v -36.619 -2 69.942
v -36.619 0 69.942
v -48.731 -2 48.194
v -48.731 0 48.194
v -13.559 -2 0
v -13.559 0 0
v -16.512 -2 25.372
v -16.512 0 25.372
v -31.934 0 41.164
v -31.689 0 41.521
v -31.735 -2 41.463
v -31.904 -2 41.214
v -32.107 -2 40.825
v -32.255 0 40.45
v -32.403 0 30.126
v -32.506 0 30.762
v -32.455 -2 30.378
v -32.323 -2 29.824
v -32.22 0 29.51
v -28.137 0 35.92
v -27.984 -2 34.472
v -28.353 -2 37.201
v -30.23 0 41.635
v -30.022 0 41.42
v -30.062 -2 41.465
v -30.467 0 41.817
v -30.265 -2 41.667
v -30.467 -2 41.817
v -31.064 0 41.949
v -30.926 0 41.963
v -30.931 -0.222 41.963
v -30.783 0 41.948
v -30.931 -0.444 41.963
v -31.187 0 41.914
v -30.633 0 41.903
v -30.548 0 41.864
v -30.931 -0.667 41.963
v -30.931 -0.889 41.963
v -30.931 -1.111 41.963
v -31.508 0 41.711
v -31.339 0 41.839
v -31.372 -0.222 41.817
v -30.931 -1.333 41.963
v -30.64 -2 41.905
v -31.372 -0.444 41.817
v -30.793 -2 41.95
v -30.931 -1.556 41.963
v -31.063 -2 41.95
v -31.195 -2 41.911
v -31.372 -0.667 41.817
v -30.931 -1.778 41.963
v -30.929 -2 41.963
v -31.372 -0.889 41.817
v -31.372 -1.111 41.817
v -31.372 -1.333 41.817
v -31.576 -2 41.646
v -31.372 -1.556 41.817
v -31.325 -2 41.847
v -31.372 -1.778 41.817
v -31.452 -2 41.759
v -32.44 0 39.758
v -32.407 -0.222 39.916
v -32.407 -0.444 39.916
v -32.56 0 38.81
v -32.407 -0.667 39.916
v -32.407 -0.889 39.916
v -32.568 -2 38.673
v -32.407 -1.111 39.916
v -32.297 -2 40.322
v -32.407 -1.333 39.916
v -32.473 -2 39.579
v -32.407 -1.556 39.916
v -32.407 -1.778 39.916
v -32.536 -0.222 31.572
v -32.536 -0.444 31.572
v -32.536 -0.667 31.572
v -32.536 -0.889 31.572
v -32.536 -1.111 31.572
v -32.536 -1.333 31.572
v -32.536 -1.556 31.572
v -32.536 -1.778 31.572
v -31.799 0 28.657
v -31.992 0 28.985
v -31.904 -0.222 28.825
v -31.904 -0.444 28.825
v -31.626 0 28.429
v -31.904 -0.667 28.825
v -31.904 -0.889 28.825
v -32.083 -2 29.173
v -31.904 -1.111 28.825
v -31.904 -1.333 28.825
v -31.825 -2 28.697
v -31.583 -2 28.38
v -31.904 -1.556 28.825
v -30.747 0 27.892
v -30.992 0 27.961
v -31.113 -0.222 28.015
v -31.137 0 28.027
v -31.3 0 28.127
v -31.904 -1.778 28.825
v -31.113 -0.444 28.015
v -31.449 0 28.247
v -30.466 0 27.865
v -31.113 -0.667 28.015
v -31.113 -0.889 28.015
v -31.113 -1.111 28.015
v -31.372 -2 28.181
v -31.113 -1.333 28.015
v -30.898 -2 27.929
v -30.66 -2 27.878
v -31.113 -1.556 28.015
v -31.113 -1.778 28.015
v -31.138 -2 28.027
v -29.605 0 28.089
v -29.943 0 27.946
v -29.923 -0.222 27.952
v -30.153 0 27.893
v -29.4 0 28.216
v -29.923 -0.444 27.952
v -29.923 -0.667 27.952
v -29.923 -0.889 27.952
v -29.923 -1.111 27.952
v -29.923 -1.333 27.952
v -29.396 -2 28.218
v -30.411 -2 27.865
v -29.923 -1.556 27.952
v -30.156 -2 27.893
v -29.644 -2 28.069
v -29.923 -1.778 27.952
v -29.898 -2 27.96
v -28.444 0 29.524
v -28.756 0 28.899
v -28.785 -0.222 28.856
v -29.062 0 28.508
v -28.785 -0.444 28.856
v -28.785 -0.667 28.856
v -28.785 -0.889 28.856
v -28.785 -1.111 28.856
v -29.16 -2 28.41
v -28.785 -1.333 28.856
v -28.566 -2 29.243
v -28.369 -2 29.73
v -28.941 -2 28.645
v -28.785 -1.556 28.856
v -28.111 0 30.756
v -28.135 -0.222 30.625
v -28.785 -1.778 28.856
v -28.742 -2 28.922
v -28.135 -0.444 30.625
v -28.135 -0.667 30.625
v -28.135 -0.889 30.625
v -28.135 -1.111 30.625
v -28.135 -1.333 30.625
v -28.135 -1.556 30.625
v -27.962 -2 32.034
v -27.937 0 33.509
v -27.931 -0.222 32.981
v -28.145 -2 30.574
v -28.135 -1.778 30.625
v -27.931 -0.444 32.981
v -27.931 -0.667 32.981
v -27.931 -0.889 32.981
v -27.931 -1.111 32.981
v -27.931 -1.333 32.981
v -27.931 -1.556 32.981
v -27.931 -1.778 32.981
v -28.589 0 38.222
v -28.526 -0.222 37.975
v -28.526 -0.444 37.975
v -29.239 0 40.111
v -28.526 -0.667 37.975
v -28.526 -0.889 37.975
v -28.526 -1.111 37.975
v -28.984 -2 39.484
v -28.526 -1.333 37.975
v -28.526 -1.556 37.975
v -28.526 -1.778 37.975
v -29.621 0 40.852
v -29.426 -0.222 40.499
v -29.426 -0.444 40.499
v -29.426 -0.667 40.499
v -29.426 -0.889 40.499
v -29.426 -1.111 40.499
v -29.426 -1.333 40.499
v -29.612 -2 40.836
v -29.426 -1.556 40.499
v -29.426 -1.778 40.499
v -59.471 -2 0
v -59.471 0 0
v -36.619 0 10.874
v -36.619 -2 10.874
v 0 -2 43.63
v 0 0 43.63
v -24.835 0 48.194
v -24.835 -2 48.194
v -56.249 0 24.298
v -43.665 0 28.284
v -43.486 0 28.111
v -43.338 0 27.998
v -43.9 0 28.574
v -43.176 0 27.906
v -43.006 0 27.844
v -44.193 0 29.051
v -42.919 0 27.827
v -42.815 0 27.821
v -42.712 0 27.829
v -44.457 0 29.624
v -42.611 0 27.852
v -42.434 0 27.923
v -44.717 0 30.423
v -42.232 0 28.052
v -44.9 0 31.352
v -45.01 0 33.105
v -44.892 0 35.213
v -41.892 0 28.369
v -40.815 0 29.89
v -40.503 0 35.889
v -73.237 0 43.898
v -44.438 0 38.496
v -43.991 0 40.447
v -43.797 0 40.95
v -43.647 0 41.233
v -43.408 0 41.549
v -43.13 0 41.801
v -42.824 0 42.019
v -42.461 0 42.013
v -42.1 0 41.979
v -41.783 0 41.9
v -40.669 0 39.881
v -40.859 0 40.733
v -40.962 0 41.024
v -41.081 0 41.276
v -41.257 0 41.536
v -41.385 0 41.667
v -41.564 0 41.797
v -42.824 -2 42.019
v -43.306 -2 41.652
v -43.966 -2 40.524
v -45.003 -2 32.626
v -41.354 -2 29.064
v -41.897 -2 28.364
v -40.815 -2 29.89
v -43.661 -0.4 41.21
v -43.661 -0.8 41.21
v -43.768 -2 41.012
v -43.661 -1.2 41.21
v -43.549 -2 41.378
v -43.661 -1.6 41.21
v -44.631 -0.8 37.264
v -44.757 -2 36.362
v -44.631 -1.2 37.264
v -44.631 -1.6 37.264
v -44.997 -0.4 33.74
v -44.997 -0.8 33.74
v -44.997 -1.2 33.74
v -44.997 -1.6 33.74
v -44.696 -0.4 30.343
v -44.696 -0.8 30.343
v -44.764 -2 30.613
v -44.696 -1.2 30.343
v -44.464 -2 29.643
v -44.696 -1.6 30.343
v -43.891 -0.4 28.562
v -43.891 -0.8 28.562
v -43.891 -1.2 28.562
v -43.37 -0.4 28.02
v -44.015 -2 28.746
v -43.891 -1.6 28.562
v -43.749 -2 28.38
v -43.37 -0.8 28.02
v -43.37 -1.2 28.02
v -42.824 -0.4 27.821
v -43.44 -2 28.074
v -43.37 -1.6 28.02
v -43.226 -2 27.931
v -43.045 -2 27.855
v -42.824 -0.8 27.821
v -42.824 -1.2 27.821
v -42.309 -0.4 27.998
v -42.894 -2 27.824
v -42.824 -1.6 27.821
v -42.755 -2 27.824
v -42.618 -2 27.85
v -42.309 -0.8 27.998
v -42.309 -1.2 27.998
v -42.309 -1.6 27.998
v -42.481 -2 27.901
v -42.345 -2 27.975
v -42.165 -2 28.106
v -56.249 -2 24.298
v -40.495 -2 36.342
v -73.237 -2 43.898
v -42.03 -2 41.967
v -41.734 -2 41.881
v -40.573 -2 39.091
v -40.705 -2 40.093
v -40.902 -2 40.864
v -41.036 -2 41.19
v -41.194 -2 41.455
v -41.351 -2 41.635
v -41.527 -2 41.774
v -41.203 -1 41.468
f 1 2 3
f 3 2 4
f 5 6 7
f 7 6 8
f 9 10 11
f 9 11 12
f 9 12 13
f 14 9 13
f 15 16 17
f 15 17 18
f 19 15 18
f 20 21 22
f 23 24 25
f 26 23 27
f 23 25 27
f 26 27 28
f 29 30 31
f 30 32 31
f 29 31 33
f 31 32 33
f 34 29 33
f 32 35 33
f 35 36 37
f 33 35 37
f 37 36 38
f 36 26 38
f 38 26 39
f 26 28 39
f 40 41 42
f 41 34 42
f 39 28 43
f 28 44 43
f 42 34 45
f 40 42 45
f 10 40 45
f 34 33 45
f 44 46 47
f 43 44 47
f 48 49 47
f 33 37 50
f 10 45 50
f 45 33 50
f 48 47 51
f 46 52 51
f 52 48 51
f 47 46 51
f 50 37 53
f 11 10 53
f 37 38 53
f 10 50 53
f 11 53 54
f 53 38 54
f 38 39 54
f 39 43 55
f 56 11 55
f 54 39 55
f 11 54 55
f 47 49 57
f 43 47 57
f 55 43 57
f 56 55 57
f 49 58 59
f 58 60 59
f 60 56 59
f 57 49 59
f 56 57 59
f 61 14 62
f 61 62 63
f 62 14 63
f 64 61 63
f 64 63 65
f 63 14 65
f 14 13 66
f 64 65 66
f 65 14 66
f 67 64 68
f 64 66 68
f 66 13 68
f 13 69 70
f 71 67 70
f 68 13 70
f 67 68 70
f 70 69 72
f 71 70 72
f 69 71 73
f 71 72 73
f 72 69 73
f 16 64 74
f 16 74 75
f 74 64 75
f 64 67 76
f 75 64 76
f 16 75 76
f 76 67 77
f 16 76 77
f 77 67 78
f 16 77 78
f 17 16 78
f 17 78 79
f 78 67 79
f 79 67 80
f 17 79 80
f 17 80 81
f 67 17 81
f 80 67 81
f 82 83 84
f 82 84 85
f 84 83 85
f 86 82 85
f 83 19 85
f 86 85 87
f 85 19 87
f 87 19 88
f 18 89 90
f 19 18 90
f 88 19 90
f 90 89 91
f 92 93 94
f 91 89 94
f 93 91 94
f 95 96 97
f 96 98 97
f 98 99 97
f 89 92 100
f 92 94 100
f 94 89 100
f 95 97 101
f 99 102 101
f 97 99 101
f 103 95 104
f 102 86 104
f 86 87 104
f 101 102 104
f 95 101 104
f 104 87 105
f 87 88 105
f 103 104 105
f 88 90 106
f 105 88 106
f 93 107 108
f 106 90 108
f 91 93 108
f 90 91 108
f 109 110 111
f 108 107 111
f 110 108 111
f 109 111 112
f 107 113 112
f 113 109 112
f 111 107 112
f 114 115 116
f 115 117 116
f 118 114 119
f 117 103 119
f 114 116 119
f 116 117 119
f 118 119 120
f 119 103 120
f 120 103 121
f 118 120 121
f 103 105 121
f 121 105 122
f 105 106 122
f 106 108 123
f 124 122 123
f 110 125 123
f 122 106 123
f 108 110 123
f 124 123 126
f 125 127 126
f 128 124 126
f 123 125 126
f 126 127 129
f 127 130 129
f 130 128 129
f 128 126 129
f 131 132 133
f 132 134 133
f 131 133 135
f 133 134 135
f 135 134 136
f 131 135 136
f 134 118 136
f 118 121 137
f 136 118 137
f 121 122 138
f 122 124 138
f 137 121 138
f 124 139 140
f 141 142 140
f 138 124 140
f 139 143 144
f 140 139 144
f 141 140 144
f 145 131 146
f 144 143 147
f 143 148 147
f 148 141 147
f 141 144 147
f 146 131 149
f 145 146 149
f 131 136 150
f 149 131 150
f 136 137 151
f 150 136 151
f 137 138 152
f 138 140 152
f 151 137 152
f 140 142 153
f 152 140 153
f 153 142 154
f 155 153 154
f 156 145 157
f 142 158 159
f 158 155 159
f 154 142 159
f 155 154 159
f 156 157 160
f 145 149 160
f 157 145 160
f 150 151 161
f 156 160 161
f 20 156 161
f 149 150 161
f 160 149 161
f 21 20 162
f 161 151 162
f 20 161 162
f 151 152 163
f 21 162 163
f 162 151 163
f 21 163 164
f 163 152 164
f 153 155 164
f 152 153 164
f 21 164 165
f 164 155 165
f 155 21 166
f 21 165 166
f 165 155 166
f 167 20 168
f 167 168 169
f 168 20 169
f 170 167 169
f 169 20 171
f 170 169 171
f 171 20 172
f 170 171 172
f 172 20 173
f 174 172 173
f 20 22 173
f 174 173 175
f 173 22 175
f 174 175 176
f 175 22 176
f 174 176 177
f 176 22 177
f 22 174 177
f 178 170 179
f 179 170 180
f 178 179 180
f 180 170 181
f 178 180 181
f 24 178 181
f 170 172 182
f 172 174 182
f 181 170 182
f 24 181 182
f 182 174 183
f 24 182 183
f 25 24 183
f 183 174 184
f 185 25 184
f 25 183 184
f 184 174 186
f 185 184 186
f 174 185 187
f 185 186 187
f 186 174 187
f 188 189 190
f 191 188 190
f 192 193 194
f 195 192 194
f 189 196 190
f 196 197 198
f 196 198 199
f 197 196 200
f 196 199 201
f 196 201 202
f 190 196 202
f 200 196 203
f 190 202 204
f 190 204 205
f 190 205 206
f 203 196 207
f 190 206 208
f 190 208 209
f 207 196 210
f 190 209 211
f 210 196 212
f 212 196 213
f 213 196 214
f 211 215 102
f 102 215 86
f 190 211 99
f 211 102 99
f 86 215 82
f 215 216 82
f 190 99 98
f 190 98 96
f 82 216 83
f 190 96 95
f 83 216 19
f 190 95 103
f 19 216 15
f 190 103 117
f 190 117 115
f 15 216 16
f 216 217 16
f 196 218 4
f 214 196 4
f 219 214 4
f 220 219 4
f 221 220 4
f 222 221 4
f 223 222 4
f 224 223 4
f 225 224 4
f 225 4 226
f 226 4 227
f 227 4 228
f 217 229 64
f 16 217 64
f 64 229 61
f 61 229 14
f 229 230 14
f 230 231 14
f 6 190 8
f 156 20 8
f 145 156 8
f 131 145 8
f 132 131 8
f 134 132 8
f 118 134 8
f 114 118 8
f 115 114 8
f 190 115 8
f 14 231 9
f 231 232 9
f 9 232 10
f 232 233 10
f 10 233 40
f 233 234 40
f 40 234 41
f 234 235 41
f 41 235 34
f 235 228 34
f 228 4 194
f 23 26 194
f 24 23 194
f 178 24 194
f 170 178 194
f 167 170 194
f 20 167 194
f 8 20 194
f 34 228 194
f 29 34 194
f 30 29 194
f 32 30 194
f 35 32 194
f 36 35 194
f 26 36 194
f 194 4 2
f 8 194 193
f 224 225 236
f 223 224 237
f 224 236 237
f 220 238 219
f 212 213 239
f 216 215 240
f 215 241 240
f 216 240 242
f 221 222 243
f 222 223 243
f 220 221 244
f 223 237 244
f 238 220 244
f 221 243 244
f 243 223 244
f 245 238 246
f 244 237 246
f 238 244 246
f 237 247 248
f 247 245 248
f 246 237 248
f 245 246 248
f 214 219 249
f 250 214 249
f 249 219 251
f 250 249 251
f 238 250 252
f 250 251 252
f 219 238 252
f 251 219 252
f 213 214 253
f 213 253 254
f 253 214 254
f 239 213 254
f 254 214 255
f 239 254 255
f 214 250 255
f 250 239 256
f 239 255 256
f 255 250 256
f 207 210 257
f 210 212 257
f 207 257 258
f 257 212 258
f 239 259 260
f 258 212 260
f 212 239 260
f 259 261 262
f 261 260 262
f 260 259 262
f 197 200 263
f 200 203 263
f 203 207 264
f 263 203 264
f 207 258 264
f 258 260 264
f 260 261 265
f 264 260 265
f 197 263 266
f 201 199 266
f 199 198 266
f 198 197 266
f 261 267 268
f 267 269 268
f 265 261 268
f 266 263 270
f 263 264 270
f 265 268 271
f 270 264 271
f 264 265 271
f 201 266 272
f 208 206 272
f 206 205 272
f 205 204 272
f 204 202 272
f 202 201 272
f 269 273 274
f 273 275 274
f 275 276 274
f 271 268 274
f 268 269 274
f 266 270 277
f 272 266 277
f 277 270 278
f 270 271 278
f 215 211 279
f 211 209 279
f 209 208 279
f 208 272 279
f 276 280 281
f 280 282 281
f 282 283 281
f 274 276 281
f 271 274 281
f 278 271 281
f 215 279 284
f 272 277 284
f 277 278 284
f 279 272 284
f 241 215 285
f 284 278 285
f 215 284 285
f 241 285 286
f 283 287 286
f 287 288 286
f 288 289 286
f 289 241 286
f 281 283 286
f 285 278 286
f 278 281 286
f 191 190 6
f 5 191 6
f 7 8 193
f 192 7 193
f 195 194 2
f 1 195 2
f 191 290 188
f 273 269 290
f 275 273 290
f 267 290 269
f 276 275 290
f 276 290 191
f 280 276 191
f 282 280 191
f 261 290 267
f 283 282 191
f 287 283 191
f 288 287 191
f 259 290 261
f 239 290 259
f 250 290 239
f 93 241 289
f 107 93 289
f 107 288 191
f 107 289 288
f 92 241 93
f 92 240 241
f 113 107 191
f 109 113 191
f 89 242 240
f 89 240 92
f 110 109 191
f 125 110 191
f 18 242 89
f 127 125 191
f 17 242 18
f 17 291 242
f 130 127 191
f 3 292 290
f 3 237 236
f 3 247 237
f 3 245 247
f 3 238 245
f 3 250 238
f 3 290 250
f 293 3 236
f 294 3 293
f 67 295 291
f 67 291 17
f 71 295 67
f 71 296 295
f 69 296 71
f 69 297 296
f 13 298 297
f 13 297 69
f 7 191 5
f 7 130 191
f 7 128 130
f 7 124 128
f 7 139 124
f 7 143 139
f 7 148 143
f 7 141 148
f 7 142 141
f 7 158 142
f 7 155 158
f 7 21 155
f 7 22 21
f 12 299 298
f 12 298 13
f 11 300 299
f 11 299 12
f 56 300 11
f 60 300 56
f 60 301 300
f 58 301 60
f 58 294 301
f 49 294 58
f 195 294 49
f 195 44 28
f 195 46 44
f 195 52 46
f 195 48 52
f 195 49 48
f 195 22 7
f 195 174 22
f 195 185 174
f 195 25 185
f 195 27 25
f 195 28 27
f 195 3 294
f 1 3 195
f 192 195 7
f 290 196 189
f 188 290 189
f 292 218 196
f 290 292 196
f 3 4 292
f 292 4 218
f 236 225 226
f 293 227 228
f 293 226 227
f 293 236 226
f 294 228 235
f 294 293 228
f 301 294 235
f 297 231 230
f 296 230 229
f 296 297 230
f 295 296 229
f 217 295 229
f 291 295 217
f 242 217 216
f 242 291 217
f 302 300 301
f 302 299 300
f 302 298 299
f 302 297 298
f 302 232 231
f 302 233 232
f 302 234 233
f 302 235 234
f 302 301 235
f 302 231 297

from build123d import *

# Parameters (mm, degrees)
F1_DEPTH = 2
F3_DEPTH = 25


with BuildPart() as f1:
    # F0 (on Front) → F1 (new body)
    with BuildSketch(Plane.XZ):
        Polygon((-48.7309247255, 48.1939427555), (-73.2373036639, 43.8981056213), (-56.2486425042, 24.2983382195), (-59.4705231488, 0), (-36.618651832, 10.8738420531), (-13.5587416589, 0), (-16.5121313184, 25.3722984344), (0, 43.6296164989), (-24.835318327, 48.1939427555), (-36.618651832, 69.941624999), align=None)
    extrude(amount=F1_DEPTH)

    # F2 (on face) → F3 (cut)
    with BuildSketch(Plane.XZ.offset(2)):
        with BuildLine():
            add(Edge.make_bspline(
                [(-42.8241454065, 42.018674314), (-42.215811031, 42.0156652147), (-40.0248783805, 42.0048278626), (-40.4838324873, 34.9711646084), (-40.8153533936, 29.8904683441)],
                knots=[0, 0, 0, 0, 0.2776600072, 1, 1, 1, 1], degree=3))
            add(Edge.make_bspline(
                [(-42.8241454065, 42.018674314), (-43.1211611971, 41.817411735), (-43.9730260473, 41.2401746918), (-44.7285981197, 37.046533313), (-45.4586501607, 30.6342959102), (-42.8138464069, 26.7380268066), (-41.4719755399, 28.85470644), (-40.8153533936, 29.8904683441)],
                knots=[0, 0, 0, 0, 0.1173333317, 0.3365213034, 0.622595536, 0.815323415, 1, 1, 1, 1], degree=3))
        make_face()
        with BuildLine():
            add(Edge.make_bspline(
                [(-30.4665230215, 41.817411735), (-30.7828157907, 42.0132867548), (-31.5566720158, 42.0016665583), (-32.758418401, 39.7526667198), (-32.4605723261, 35.8588497009), (-32.5698270564, 31.5889371812), (-32.4797926297, 29.976349033), (-31.378124697, 27.4296174444), (-27.4746603802, 28.3933105876), (-27.939027342, 38.0017634716), (-29.776947659, 41.3903688148), (-30.4665230215, 41.817411735)],
                knots=[0, 0, 0, 0, 0.0595652349, 0.1516653863, 0.2790521251, 0.4073989231, 0.4888413673, 0.5825769232, 0.6810659238, 0.8701370299, 1, 1, 1, 1], degree=3))
        make_face()
    extrude(amount=-F3_DEPTH, mode=Mode.SUBTRACT)


solid = f1.part
